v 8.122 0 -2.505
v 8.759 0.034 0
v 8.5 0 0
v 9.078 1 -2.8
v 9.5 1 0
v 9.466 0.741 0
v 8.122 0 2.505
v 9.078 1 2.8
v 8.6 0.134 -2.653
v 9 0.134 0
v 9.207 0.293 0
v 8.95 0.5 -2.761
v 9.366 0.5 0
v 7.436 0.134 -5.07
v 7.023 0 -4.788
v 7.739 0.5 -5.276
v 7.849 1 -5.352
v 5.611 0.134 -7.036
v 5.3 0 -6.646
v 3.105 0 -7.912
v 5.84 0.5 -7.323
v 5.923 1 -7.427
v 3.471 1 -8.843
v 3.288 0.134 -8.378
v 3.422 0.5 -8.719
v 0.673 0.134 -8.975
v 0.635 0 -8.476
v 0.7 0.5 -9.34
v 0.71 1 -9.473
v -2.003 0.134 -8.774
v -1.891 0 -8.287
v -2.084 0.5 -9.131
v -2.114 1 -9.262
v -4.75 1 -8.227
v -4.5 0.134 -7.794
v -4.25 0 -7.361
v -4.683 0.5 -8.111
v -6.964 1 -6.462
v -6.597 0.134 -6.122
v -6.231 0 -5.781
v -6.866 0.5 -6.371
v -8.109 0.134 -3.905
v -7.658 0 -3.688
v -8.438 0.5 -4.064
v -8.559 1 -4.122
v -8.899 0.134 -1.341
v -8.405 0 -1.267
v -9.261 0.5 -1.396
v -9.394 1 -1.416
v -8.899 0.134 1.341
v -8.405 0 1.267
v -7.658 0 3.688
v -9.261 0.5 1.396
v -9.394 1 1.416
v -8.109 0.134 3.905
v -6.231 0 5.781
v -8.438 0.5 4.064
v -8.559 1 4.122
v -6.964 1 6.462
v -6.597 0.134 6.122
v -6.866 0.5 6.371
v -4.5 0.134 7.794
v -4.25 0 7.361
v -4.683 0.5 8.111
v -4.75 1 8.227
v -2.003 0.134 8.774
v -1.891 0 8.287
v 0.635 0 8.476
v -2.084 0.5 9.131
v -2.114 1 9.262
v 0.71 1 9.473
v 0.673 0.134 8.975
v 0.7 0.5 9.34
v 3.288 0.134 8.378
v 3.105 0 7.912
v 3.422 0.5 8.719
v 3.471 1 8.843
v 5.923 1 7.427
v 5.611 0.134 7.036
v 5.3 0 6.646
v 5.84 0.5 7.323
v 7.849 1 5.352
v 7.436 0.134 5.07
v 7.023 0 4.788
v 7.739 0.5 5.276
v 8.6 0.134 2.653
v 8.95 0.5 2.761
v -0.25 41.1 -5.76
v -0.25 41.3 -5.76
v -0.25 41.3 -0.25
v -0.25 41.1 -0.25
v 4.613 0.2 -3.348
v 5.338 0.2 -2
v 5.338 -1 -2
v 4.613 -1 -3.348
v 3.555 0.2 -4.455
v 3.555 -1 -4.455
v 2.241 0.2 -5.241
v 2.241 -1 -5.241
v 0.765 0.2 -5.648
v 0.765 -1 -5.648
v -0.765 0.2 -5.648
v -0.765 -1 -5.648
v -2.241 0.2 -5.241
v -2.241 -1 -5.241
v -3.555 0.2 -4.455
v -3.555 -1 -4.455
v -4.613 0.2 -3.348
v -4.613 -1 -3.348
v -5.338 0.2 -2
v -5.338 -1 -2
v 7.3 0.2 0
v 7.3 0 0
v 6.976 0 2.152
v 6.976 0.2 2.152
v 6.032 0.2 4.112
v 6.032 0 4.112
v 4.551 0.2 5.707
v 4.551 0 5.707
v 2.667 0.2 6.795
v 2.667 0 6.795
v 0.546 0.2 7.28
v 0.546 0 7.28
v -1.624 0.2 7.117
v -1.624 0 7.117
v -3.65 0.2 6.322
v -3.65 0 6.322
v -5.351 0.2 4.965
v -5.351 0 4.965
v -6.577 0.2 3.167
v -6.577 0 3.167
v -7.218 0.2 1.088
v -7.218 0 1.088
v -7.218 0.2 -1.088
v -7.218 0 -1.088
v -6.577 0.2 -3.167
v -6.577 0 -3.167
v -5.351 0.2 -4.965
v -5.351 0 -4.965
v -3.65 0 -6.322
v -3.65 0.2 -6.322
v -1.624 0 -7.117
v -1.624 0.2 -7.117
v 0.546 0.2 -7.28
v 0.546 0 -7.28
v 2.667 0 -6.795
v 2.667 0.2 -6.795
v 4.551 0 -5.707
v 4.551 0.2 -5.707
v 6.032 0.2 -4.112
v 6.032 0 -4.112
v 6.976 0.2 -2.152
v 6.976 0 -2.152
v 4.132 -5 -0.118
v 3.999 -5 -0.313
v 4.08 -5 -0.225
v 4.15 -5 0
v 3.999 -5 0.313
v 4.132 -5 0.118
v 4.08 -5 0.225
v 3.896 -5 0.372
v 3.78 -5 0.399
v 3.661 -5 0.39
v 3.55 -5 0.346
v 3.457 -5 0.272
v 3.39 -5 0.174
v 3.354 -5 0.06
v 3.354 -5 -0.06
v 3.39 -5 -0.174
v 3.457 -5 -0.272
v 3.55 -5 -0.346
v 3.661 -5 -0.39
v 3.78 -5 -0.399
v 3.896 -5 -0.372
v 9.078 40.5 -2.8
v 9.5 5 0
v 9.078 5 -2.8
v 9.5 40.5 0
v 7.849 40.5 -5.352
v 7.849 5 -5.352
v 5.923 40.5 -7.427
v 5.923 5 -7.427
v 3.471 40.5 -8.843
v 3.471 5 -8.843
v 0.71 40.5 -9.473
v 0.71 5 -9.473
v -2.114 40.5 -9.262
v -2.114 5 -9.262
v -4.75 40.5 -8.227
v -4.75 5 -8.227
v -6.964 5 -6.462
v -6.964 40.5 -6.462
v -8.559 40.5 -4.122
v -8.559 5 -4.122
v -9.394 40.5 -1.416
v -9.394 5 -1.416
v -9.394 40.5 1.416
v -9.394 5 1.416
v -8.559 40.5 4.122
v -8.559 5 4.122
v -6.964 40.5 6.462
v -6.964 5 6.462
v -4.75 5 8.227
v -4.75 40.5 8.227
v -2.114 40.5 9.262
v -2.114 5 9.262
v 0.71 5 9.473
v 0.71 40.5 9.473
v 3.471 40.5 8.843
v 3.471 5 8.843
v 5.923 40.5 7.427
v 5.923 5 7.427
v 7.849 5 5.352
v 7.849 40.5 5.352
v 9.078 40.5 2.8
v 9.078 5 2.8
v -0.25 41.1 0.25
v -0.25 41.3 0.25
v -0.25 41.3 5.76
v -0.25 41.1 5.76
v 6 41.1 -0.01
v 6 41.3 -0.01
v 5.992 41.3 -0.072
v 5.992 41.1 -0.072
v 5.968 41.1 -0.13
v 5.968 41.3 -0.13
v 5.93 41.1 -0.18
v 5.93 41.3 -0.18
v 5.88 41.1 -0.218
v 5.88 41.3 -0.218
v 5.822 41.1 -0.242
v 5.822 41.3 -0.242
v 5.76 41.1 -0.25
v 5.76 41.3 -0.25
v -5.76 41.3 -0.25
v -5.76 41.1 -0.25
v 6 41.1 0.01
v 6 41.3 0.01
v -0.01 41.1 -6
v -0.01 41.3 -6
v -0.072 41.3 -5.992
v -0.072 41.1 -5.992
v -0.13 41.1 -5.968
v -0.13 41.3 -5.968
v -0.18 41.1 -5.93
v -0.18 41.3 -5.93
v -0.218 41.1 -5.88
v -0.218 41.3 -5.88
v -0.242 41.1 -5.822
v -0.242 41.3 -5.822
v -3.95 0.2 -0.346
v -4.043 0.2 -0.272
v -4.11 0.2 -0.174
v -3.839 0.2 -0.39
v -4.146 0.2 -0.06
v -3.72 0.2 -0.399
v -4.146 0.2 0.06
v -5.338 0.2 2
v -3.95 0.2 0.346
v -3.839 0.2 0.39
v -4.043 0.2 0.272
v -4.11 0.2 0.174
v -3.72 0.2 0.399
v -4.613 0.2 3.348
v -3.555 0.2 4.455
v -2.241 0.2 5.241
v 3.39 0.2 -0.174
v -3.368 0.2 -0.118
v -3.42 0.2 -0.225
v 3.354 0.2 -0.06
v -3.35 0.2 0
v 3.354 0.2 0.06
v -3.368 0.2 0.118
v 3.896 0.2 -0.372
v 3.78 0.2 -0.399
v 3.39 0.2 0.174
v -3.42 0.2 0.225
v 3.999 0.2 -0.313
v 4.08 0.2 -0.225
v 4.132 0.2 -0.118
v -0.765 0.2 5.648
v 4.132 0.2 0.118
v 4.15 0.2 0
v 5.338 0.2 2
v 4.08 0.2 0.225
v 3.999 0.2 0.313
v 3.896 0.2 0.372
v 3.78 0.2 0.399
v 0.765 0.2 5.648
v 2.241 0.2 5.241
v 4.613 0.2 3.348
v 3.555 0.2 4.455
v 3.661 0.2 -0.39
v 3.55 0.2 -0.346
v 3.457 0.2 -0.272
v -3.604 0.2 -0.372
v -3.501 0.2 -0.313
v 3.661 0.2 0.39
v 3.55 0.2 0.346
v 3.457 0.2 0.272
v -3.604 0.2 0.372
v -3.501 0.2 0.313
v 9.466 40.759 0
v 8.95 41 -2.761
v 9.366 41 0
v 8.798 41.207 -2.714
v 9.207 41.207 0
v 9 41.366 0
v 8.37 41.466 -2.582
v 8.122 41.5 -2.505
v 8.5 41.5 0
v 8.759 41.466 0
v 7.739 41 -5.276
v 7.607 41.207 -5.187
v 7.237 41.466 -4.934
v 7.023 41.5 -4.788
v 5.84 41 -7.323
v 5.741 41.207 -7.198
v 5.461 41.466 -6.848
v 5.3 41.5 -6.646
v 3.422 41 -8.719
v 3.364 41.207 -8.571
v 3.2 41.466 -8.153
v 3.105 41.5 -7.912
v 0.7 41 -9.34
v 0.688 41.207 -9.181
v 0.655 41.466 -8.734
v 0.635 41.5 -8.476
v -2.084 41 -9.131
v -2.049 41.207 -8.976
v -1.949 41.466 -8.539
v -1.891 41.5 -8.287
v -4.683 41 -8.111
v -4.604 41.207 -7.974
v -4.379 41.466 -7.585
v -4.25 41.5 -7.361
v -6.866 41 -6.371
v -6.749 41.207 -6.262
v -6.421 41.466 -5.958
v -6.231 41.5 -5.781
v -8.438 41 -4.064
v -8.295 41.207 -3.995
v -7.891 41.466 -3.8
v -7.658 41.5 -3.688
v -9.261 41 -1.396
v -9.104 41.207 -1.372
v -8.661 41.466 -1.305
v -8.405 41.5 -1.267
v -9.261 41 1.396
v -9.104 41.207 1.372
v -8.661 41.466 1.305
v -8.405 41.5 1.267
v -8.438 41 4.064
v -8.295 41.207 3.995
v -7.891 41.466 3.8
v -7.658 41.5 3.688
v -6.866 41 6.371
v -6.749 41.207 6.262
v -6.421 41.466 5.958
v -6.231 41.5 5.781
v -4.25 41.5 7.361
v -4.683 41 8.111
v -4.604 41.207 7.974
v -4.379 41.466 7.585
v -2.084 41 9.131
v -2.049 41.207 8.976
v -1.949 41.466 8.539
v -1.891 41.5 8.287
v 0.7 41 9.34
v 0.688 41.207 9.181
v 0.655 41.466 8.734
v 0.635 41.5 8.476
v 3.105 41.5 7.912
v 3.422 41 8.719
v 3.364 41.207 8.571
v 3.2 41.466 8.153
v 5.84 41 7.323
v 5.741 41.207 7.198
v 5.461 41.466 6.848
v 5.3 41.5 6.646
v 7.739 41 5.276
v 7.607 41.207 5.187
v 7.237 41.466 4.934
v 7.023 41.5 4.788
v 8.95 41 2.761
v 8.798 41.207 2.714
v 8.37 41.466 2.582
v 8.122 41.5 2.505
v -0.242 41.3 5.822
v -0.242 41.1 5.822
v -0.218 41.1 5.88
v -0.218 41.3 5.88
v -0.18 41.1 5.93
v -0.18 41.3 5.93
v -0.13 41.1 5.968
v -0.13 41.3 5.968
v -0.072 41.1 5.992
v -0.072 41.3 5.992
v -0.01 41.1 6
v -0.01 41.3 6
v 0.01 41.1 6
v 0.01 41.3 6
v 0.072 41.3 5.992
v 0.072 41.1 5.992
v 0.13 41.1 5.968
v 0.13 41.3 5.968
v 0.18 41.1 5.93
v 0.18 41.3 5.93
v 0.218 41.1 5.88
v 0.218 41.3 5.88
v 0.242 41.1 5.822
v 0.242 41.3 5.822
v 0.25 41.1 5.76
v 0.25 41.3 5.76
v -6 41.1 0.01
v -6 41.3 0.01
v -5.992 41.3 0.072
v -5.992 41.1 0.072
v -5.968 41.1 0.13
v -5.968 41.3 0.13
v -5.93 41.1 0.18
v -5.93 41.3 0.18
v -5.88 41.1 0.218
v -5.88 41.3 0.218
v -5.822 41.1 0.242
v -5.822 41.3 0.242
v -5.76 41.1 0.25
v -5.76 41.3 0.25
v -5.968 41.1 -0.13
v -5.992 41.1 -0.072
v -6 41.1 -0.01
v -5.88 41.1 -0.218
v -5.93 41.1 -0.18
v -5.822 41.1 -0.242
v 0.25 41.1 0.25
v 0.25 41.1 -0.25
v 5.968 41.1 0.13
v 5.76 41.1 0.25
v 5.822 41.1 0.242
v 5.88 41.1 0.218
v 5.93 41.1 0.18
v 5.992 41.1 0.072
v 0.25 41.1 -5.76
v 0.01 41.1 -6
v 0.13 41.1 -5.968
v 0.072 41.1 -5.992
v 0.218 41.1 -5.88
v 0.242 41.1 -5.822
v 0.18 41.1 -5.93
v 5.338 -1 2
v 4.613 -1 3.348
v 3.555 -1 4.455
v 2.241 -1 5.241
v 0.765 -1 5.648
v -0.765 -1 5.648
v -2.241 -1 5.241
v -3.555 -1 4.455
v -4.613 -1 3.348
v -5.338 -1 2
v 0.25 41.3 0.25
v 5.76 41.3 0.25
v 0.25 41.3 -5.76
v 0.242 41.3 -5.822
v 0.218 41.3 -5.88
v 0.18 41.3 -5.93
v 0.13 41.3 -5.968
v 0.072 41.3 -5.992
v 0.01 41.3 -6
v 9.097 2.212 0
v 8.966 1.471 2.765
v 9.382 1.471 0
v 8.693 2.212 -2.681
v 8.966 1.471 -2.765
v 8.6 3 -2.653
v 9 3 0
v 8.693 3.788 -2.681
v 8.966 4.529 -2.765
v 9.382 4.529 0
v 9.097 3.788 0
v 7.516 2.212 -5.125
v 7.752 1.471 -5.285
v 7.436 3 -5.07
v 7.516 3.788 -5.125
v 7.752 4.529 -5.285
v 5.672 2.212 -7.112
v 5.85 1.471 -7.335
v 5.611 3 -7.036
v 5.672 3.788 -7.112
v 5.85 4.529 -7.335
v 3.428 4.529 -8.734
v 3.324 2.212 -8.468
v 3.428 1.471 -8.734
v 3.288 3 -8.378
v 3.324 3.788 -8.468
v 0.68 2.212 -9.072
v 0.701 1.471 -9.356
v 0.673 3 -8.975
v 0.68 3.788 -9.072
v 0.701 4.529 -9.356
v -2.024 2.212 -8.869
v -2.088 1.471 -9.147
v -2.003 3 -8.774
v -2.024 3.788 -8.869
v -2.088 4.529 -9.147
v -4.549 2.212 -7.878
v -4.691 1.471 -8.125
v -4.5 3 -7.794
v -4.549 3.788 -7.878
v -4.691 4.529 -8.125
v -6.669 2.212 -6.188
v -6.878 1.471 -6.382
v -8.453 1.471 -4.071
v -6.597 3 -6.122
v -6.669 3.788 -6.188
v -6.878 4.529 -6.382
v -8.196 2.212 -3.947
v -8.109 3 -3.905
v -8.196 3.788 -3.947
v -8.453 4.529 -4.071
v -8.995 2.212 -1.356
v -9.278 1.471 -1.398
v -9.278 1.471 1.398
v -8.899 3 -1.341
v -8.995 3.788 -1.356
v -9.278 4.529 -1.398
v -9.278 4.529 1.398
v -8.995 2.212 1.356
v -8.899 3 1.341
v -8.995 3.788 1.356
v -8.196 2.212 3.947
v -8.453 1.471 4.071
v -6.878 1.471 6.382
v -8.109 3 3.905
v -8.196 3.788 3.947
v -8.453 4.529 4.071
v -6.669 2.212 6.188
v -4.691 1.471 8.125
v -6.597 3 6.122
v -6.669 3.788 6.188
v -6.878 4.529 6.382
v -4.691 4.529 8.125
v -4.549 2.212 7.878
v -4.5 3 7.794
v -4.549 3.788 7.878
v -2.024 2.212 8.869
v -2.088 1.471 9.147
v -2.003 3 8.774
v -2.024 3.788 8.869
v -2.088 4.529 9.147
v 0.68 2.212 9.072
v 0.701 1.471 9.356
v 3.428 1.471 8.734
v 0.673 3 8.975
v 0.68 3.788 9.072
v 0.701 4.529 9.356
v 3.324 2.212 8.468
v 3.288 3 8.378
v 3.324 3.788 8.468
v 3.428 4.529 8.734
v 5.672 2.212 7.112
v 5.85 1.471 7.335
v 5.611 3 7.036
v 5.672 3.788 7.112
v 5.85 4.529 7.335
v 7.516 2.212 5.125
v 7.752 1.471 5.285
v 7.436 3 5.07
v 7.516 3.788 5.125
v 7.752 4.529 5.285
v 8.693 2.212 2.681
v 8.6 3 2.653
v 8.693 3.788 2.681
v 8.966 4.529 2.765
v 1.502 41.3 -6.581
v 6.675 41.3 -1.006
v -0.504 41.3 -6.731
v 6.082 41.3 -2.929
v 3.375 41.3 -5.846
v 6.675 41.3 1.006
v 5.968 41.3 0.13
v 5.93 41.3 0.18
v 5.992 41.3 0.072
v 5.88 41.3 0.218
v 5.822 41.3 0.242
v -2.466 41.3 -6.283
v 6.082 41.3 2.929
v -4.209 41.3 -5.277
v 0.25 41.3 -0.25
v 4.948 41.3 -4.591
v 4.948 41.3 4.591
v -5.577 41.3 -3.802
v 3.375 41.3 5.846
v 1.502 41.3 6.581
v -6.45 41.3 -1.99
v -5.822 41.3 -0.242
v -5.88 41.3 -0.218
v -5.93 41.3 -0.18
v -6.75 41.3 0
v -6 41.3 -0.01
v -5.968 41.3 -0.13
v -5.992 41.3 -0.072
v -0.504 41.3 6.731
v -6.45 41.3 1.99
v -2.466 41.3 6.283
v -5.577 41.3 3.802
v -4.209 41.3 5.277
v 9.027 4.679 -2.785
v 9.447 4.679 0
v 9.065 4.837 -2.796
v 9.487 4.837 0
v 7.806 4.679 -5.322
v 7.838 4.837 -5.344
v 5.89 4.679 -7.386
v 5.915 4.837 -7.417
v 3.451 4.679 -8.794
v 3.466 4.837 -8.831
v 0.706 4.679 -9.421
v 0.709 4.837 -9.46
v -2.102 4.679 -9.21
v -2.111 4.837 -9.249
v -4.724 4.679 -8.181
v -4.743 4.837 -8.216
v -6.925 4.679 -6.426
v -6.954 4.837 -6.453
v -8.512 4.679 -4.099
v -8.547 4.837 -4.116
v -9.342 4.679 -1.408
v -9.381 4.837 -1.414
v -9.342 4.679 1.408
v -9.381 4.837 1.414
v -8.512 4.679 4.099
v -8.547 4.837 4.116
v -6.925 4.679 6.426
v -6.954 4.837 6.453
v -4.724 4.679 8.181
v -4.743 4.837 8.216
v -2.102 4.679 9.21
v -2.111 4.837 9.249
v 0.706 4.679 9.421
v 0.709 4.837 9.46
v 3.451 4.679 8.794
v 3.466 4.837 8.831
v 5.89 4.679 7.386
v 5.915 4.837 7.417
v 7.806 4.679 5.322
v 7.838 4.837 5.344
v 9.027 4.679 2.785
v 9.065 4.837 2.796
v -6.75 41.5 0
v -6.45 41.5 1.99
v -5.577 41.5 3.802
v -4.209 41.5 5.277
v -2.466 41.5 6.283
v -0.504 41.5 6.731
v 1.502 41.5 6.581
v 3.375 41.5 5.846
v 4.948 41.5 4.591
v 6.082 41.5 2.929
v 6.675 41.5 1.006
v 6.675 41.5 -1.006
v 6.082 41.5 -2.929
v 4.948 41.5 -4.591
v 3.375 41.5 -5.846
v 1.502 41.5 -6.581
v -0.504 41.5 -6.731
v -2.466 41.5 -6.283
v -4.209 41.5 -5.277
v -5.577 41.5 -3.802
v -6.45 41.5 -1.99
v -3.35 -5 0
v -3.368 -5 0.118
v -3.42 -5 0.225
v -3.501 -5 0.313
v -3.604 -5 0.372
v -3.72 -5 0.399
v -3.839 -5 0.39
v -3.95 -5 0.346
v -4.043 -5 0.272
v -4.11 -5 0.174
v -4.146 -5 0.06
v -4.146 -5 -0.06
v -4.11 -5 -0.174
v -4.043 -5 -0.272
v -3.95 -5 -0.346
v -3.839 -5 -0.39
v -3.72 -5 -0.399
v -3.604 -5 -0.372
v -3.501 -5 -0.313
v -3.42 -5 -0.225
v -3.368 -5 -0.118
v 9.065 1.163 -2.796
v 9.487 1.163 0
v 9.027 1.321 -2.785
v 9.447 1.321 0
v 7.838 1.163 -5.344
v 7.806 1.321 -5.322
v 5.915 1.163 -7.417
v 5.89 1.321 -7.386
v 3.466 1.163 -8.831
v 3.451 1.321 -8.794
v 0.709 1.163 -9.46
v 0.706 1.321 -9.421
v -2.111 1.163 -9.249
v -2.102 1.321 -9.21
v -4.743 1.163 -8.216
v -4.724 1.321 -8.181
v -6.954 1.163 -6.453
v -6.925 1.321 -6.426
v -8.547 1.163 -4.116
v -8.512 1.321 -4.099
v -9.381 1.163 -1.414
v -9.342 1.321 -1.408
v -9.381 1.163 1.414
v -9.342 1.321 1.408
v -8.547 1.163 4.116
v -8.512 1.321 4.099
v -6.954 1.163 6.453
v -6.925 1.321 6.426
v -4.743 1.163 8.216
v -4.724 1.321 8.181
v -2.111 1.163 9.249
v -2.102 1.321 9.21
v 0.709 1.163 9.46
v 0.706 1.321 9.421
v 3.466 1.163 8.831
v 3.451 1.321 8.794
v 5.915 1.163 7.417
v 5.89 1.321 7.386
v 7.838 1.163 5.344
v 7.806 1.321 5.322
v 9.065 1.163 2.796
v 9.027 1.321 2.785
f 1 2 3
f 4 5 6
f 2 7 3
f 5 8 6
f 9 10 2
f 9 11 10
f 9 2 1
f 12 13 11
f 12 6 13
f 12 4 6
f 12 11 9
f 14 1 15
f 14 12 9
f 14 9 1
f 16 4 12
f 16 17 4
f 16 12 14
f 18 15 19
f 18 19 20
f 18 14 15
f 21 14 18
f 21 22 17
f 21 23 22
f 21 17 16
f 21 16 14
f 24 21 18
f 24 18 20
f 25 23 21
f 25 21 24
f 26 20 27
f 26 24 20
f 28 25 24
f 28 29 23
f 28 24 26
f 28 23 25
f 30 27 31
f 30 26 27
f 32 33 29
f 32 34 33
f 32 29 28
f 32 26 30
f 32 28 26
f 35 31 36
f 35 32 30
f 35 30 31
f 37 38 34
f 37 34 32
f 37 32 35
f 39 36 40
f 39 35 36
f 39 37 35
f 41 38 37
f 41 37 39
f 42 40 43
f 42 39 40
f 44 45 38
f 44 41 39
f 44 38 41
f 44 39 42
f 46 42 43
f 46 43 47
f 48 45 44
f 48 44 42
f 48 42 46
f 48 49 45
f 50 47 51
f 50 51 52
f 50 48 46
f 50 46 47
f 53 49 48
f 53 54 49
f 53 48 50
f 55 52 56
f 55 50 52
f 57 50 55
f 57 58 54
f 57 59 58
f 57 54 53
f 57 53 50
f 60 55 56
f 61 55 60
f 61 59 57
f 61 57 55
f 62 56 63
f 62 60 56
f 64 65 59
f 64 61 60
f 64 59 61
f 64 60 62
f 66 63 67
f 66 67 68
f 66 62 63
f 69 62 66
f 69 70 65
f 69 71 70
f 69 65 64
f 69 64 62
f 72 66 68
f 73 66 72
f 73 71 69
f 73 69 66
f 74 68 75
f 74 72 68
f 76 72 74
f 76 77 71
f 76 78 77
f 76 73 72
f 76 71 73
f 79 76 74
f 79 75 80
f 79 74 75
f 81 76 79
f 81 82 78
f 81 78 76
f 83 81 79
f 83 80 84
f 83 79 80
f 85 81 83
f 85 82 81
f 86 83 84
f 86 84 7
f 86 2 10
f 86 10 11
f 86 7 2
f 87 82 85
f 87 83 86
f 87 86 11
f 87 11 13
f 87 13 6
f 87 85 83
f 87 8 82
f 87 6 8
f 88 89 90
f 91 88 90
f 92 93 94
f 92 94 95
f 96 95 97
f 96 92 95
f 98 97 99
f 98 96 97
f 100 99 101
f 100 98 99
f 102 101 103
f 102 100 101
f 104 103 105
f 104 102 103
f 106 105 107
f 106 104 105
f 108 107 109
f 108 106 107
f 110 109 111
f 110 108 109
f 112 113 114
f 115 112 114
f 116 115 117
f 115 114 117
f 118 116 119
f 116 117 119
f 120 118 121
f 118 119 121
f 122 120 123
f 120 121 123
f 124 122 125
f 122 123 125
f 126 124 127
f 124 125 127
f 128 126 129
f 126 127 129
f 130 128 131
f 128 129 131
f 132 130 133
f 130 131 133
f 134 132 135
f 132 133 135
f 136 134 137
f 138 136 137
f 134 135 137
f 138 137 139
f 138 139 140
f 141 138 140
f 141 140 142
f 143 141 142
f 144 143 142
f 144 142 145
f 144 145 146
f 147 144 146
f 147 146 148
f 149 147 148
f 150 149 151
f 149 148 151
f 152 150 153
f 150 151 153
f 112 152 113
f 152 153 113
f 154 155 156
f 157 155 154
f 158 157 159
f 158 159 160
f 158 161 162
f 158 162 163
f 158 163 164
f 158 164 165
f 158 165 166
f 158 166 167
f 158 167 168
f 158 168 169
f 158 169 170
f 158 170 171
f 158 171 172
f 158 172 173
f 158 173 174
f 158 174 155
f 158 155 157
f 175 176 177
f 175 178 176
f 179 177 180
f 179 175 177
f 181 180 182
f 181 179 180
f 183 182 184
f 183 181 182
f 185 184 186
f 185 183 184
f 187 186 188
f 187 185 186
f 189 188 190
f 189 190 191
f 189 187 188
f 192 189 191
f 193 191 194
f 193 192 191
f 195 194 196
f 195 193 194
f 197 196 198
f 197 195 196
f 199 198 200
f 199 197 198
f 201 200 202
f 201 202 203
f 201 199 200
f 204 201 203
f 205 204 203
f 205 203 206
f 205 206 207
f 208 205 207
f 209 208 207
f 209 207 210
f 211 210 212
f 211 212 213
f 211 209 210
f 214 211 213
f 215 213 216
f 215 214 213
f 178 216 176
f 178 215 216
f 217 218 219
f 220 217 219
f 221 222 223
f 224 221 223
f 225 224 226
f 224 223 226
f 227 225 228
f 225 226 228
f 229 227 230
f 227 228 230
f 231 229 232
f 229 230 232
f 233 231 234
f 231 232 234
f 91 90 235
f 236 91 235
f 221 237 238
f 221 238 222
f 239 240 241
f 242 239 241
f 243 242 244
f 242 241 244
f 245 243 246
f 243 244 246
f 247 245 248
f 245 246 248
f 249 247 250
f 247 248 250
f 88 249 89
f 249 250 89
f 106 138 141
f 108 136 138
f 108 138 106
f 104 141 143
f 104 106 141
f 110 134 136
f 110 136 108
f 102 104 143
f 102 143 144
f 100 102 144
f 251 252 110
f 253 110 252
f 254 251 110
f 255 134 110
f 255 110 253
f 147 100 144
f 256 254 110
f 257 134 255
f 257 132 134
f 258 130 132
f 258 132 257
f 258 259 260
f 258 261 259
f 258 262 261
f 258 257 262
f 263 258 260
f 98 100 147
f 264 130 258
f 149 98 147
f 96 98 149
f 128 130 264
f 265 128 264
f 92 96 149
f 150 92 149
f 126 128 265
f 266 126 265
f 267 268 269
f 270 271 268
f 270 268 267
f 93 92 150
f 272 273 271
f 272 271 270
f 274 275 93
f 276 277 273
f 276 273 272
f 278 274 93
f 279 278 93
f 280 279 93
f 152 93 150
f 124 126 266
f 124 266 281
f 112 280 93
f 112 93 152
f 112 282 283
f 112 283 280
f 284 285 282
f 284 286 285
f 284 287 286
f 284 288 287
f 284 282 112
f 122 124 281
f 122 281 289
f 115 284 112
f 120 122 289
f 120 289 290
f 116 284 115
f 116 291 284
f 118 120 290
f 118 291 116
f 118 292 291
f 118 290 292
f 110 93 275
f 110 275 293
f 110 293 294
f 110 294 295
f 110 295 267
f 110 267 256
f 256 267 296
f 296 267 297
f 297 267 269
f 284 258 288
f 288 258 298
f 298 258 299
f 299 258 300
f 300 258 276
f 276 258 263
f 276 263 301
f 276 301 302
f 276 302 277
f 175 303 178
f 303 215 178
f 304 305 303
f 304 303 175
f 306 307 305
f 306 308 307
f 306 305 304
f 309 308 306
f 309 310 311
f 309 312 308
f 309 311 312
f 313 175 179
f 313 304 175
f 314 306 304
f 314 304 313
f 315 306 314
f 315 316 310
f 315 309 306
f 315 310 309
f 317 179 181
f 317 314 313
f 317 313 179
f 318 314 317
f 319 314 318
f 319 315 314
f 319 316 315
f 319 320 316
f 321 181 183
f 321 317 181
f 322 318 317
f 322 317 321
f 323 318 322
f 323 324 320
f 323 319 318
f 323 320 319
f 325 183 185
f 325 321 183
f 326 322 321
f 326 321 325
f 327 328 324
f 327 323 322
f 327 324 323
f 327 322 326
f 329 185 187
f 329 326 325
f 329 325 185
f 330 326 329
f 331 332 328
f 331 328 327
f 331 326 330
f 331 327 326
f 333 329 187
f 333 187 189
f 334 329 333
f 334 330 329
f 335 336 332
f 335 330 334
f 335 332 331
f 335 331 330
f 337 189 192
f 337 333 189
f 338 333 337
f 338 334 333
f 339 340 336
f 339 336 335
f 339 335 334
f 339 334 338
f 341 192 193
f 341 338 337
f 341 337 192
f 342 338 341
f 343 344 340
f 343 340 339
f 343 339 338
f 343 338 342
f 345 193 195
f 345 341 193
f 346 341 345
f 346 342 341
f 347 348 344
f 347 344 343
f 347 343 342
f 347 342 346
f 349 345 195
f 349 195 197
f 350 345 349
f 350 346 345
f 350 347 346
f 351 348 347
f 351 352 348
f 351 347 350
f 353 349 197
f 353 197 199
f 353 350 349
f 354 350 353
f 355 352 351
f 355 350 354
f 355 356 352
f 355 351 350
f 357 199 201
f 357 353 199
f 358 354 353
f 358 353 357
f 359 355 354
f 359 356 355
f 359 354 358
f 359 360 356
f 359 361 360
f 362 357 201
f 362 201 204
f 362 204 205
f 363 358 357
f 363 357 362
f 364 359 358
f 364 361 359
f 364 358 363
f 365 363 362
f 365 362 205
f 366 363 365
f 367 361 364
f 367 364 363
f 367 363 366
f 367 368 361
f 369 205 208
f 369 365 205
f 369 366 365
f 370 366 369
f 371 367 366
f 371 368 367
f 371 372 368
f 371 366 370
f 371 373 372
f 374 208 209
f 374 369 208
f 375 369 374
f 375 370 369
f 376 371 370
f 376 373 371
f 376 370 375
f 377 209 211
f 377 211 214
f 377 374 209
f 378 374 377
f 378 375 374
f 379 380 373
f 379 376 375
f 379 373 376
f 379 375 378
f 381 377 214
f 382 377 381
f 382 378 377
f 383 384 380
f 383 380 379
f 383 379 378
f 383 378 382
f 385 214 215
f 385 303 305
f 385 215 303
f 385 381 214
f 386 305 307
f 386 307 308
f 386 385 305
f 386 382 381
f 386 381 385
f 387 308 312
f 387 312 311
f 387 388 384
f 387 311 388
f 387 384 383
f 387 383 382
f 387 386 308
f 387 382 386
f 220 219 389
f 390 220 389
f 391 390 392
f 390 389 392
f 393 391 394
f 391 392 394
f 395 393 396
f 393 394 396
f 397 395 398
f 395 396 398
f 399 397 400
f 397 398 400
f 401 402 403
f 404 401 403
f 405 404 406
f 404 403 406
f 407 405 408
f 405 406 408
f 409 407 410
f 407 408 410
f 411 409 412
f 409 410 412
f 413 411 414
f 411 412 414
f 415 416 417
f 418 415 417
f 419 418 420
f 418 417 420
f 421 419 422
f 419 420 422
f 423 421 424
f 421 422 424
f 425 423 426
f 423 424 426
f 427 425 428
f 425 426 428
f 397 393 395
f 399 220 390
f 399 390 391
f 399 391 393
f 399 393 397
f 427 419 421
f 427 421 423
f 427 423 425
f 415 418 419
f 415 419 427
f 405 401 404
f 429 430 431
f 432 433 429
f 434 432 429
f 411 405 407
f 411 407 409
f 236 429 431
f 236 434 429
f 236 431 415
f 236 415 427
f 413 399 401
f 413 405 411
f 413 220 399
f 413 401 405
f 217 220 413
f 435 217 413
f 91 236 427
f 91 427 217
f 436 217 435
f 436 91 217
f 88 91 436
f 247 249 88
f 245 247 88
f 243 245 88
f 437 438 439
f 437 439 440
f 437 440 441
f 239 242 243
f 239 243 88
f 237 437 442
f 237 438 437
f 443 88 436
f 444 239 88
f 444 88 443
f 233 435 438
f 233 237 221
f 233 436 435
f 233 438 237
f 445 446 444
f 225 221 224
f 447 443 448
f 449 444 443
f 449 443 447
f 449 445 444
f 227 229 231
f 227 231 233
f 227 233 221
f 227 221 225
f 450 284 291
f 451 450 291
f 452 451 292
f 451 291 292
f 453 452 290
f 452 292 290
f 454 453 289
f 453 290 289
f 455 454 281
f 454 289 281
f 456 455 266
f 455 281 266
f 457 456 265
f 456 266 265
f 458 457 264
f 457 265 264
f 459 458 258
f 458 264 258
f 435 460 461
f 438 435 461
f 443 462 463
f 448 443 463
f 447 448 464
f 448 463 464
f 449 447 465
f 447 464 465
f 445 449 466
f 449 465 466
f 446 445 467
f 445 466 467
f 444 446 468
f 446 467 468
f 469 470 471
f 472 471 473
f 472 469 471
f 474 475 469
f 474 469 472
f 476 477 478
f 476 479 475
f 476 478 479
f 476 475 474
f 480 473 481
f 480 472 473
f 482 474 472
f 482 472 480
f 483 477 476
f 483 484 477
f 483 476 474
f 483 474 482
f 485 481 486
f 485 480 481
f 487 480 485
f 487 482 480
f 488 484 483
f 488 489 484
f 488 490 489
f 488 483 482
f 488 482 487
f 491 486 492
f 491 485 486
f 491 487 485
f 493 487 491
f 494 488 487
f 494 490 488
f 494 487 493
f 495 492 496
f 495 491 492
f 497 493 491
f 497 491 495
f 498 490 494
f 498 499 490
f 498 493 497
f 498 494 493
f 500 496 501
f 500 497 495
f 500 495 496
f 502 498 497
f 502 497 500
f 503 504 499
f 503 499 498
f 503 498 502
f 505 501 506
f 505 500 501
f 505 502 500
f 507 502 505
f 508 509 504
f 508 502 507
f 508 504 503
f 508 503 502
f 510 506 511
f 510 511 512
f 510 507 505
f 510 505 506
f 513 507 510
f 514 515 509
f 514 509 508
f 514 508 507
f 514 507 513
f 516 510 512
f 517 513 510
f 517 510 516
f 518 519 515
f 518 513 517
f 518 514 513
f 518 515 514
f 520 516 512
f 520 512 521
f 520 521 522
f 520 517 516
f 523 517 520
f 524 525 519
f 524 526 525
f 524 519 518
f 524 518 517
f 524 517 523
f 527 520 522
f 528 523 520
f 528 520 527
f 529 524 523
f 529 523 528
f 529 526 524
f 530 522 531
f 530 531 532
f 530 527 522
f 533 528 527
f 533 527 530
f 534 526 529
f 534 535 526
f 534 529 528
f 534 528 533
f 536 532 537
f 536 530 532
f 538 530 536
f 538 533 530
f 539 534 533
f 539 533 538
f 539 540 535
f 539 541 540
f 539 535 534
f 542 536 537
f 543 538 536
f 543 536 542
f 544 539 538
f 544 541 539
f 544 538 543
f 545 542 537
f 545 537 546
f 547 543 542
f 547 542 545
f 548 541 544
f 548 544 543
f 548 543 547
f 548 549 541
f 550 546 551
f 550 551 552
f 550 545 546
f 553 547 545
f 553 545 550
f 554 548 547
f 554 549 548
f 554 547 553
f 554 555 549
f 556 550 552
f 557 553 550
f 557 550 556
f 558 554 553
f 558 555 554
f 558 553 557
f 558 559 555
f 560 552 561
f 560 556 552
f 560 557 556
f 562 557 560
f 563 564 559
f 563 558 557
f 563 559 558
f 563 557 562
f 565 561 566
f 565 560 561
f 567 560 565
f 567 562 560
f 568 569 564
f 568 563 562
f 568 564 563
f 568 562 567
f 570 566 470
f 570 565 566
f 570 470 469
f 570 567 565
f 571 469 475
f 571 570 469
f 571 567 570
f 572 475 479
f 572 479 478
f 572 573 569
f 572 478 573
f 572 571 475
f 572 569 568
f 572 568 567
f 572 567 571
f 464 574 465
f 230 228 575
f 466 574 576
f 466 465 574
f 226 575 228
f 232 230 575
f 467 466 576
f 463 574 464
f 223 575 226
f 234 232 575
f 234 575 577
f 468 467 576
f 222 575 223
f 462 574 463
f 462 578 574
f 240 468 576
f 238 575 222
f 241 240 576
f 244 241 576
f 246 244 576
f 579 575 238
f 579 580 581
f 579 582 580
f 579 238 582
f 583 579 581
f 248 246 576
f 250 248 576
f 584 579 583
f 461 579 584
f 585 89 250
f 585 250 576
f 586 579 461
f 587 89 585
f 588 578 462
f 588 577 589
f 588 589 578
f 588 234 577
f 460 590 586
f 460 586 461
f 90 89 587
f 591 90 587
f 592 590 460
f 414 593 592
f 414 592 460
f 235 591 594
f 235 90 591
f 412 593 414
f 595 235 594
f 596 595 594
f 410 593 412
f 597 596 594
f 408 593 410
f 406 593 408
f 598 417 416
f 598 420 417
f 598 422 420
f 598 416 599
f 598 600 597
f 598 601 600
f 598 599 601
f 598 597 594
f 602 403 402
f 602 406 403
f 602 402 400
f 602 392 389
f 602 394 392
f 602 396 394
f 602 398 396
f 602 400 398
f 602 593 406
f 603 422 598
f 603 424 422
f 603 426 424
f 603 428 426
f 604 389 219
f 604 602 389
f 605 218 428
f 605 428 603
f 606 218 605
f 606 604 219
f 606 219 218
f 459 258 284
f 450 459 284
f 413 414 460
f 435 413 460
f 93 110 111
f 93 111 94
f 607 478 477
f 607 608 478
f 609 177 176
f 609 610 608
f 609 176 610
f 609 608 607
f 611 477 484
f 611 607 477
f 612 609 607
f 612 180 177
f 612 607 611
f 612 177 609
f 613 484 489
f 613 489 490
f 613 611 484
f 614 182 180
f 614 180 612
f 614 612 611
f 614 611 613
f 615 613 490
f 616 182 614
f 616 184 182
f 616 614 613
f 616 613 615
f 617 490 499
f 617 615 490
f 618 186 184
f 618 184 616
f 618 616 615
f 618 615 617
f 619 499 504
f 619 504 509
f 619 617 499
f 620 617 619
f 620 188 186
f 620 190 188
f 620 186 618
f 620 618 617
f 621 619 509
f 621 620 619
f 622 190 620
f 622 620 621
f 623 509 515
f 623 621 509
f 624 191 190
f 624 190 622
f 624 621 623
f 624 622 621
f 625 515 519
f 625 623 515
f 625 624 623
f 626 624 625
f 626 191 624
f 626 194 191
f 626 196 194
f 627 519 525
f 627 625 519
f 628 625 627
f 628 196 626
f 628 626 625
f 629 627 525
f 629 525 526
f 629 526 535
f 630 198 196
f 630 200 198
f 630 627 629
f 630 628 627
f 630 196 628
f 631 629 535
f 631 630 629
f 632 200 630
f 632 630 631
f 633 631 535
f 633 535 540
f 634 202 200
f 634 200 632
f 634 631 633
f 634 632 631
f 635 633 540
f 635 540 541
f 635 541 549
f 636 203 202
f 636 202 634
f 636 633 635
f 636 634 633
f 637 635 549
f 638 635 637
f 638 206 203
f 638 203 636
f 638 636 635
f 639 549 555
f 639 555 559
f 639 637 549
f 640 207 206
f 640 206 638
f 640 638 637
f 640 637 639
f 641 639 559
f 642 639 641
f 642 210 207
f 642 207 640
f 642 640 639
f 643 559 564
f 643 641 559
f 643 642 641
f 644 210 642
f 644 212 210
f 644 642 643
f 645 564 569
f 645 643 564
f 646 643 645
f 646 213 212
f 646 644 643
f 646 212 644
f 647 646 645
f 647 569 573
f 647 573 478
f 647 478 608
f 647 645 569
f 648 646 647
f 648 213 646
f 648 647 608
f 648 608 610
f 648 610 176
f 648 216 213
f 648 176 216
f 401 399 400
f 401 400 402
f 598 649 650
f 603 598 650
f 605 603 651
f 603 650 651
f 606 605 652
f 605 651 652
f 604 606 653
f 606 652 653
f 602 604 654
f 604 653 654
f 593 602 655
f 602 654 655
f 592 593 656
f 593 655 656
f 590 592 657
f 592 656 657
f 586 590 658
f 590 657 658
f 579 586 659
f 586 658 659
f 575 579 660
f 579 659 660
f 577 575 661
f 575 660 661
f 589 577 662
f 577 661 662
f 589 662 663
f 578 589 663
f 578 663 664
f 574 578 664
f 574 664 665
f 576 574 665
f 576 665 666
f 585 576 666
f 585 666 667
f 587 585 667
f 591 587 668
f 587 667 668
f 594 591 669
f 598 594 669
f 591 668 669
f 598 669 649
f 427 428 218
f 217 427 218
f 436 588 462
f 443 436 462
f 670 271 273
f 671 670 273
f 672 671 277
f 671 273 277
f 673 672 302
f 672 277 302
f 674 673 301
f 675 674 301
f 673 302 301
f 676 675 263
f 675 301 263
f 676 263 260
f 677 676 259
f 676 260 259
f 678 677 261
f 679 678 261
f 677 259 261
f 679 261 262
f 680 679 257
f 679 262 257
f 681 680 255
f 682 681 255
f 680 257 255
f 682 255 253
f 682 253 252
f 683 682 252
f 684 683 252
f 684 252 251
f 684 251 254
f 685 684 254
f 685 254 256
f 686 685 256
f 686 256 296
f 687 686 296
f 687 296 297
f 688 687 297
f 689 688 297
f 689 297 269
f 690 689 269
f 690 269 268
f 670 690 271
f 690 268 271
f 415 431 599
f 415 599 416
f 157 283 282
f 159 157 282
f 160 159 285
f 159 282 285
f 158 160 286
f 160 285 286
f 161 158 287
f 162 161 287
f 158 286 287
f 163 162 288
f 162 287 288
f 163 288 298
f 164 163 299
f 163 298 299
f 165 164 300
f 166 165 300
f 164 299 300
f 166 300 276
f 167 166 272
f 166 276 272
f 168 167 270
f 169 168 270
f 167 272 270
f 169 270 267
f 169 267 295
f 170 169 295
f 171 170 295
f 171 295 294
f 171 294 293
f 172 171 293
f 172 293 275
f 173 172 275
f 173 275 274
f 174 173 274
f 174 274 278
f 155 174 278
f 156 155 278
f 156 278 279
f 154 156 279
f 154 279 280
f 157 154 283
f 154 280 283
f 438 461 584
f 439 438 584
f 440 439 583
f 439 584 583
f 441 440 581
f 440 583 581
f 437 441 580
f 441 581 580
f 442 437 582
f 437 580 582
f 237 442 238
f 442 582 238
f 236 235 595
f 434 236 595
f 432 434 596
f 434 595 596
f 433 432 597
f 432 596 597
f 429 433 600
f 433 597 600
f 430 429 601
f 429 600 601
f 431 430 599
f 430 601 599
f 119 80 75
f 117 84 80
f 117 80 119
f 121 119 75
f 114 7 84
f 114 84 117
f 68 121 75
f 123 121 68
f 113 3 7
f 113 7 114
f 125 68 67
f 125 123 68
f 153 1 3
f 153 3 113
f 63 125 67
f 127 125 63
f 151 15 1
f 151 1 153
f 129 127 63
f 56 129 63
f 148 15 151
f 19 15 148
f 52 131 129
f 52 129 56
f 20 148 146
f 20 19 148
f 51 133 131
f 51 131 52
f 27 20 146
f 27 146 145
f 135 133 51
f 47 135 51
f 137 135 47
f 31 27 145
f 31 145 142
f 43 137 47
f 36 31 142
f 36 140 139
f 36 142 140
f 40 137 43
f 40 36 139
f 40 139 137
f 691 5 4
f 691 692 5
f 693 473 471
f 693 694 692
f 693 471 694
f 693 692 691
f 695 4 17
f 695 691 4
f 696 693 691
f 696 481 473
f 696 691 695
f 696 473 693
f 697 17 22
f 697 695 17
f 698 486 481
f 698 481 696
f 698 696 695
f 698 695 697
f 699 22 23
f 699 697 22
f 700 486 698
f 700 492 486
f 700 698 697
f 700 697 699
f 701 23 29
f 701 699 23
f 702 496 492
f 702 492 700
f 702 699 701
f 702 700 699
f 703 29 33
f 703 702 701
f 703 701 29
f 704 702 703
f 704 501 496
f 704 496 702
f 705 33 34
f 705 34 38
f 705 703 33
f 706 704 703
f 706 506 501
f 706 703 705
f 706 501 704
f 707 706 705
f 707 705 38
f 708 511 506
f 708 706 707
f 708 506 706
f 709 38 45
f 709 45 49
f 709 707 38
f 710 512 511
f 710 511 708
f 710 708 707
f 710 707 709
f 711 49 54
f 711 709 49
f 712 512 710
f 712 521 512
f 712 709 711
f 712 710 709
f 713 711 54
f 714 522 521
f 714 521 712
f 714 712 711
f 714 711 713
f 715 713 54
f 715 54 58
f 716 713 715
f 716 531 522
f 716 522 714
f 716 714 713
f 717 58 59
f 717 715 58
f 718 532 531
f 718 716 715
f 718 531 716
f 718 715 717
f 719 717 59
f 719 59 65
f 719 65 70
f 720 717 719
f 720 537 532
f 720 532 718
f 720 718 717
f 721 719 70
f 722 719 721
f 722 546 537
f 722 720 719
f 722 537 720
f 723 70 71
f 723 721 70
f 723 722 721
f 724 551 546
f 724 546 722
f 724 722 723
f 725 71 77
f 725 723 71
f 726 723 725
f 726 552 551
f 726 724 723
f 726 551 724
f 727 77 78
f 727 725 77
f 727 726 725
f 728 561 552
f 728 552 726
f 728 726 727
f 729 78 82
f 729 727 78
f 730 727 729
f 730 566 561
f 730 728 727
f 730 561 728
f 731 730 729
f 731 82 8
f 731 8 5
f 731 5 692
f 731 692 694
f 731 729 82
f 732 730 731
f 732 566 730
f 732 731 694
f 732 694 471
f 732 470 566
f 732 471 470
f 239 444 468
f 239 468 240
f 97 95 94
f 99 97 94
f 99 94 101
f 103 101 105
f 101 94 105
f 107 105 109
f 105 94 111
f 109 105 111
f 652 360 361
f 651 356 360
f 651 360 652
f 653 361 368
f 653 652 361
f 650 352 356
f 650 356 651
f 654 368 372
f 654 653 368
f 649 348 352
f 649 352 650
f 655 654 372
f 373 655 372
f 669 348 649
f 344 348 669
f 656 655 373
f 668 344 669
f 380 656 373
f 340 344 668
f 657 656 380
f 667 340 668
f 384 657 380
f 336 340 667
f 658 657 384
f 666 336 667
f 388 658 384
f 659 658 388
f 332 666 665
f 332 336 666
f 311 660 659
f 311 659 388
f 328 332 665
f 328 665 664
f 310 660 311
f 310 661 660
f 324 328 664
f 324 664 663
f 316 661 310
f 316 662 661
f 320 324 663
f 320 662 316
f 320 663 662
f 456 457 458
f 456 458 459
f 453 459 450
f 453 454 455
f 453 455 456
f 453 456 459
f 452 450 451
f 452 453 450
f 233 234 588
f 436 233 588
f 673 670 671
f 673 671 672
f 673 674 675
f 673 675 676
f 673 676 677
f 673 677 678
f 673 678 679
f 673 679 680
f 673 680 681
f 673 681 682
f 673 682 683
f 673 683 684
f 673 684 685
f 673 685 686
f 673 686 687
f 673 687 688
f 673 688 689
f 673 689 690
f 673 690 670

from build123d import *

# Parameters (mm, degrees)
SKETCH_3_R          = 6.75
CUT_EXTRUDE_1_DEPTH = 0.2
CUT_EXTRUDE_2_DEPTH = 0.2
SKETCH_5_R          = 7.3
CUT_EXTRUDE_3_DEPTH = 0.2
EXTRUDE_1_DEPTH     = 1.2
SKETCH_7_R          = 0.4
EXTRUDE_2_DEPTH     = 5.2


with BuildPart() as part:
    # Эскиз2 → Повернуть1 (revolve)
    with BuildSketch(Plane.XY):
        with BuildLine():
            Line((0, 0), (8.5, 0))
            ThreePointArc((8.5, 0), (9.207106781, 0.292893219), (9.5, 1))
            ThreePointArc((9.5, 1), (9.4701425, 1.242535625), (9.382352941, 1.470588235))
            ThreePointArc((9.382352941, 1.470588235), (9, 3), (9.382352941, 4.529411765))
            ThreePointArc((9.382352941, 4.529411765), (9.4701425, 4.757464375), (9.5, 5))
            Line((9.5, 5), (9.5, 40.5))
            ThreePointArc((9.5, 40.5), (9.207106781, 41.207106781), (8.5, 41.5))
            Line((8.5, 41.5), (0, 41.5))
            Line((0, 41.5), (0, 0))
        make_face()
    revolve(axis=Axis((0, 0, 0), (0, 1, 0)))

    # Эскиз3 → Вырез-Вытянуть1 (cut)
    with BuildSketch(Plane(origin=(0, 41.5, 0), x_dir=(1, 0, 0), z_dir=(0, 1, 0))):
        with Locations(Location((0, 0, 0), (0, 0, 180))):
            Circle(SKETCH_3_R)
    extrude(amount=-CUT_EXTRUDE_1_DEPTH, mode=Mode.SUBTRACT)

    # Эскиз4 → Вырез-Вытянуть2 (cut)
    with BuildSketch(Plane(origin=(0, 41.3, 0), x_dir=(1, 0, 0), z_dir=(0, 1, 0))):
        with BuildLine():
            Line((-0.25, -0.25), (-0.25, -5.76))
            ThreePointArc((-0.25, -5.76), (-0.179705627, -5.929705627), (-0.01, -6))
            Line((-0.01, -6), (0.01, -6))
            ThreePointArc((0.01, -6), (0.179705627, -5.929705627), (0.25, -5.76))
            Line((0.25, -5.76), (0.25, -0.25))
            Line((0.25, -0.25), (5.76, -0.25))
            ThreePointArc((5.76, -0.25), (5.929705627, -0.179705627), (6, -0.01))
            Line((6, -0.01), (6, 0.01))
            ThreePointArc((6, 0.01), (5.929705627, 0.179705627), (5.76, 0.25))
            Line((5.76, 0.25), (0.25, 0.25))
            Line((0.25, 0.25), (0.25, 5.76))
            ThreePointArc((0.25, 5.76), (0.179705627, 5.929705627), (0.01, 6))
            Line((0.01, 6), (-0.01, 6))
            ThreePointArc((-0.01, 6), (-0.179705627, 5.929705627), (-0.25, 5.76))
            Line((-0.25, 5.76), (-0.25, 0.25))
            Line((-0.25, 0.25), (-5.76, 0.25))
            ThreePointArc((-5.76, 0.25), (-5.929705627, 0.179705627), (-6, 0.01))
            Line((-6, 0.01), (-6, -0.01))
            ThreePointArc((-6, -0.01), (-5.929705627, -0.179705627), (-5.76, -0.25))
            Line((-5.76, -0.25), (-0.25, -0.25))
        make_face()
    extrude(amount=-CUT_EXTRUDE_2_DEPTH, mode=Mode.SUBTRACT)

    # Эскиз5 → Вырез-Вытянуть3 (cut)
    with BuildSketch(Plane.XZ):
        Circle(SKETCH_5_R)
    extrude(amount=-CUT_EXTRUDE_3_DEPTH, mode=Mode.SUBTRACT)

    # Эскиз6 → Бобышка-Вытянуть1 (add)
    with BuildSketch(Plane.XZ.offset(-0.2)):
        with BuildLine():
            Line((-5.337602458, 2), (5.337602458, 2))
            ThreePointArc((5.337602458, 2), (0, 5.7), (-5.337602458, 2))
        make_face()
        with BuildLine():
            Line((-5.337602458, -2), (5.337602458, -2))
            ThreePointArc((5.337602458, -2), (0, -5.7), (-5.337602458, -2))
        make_face()
    extrude(amount=EXTRUDE_1_DEPTH)

    # Эскиз7 → Бобышка-Вытянуть2 (add)
    with BuildSketch(Plane.XZ.offset(-0.2)):
        with Locations((-3.75, 0)):
            Circle(SKETCH_7_R)
        with Locations((3.75, 0)):
            Circle(SKETCH_7_R)
    extrude(amount=EXTRUDE_2_DEPTH)


solid = part.part
